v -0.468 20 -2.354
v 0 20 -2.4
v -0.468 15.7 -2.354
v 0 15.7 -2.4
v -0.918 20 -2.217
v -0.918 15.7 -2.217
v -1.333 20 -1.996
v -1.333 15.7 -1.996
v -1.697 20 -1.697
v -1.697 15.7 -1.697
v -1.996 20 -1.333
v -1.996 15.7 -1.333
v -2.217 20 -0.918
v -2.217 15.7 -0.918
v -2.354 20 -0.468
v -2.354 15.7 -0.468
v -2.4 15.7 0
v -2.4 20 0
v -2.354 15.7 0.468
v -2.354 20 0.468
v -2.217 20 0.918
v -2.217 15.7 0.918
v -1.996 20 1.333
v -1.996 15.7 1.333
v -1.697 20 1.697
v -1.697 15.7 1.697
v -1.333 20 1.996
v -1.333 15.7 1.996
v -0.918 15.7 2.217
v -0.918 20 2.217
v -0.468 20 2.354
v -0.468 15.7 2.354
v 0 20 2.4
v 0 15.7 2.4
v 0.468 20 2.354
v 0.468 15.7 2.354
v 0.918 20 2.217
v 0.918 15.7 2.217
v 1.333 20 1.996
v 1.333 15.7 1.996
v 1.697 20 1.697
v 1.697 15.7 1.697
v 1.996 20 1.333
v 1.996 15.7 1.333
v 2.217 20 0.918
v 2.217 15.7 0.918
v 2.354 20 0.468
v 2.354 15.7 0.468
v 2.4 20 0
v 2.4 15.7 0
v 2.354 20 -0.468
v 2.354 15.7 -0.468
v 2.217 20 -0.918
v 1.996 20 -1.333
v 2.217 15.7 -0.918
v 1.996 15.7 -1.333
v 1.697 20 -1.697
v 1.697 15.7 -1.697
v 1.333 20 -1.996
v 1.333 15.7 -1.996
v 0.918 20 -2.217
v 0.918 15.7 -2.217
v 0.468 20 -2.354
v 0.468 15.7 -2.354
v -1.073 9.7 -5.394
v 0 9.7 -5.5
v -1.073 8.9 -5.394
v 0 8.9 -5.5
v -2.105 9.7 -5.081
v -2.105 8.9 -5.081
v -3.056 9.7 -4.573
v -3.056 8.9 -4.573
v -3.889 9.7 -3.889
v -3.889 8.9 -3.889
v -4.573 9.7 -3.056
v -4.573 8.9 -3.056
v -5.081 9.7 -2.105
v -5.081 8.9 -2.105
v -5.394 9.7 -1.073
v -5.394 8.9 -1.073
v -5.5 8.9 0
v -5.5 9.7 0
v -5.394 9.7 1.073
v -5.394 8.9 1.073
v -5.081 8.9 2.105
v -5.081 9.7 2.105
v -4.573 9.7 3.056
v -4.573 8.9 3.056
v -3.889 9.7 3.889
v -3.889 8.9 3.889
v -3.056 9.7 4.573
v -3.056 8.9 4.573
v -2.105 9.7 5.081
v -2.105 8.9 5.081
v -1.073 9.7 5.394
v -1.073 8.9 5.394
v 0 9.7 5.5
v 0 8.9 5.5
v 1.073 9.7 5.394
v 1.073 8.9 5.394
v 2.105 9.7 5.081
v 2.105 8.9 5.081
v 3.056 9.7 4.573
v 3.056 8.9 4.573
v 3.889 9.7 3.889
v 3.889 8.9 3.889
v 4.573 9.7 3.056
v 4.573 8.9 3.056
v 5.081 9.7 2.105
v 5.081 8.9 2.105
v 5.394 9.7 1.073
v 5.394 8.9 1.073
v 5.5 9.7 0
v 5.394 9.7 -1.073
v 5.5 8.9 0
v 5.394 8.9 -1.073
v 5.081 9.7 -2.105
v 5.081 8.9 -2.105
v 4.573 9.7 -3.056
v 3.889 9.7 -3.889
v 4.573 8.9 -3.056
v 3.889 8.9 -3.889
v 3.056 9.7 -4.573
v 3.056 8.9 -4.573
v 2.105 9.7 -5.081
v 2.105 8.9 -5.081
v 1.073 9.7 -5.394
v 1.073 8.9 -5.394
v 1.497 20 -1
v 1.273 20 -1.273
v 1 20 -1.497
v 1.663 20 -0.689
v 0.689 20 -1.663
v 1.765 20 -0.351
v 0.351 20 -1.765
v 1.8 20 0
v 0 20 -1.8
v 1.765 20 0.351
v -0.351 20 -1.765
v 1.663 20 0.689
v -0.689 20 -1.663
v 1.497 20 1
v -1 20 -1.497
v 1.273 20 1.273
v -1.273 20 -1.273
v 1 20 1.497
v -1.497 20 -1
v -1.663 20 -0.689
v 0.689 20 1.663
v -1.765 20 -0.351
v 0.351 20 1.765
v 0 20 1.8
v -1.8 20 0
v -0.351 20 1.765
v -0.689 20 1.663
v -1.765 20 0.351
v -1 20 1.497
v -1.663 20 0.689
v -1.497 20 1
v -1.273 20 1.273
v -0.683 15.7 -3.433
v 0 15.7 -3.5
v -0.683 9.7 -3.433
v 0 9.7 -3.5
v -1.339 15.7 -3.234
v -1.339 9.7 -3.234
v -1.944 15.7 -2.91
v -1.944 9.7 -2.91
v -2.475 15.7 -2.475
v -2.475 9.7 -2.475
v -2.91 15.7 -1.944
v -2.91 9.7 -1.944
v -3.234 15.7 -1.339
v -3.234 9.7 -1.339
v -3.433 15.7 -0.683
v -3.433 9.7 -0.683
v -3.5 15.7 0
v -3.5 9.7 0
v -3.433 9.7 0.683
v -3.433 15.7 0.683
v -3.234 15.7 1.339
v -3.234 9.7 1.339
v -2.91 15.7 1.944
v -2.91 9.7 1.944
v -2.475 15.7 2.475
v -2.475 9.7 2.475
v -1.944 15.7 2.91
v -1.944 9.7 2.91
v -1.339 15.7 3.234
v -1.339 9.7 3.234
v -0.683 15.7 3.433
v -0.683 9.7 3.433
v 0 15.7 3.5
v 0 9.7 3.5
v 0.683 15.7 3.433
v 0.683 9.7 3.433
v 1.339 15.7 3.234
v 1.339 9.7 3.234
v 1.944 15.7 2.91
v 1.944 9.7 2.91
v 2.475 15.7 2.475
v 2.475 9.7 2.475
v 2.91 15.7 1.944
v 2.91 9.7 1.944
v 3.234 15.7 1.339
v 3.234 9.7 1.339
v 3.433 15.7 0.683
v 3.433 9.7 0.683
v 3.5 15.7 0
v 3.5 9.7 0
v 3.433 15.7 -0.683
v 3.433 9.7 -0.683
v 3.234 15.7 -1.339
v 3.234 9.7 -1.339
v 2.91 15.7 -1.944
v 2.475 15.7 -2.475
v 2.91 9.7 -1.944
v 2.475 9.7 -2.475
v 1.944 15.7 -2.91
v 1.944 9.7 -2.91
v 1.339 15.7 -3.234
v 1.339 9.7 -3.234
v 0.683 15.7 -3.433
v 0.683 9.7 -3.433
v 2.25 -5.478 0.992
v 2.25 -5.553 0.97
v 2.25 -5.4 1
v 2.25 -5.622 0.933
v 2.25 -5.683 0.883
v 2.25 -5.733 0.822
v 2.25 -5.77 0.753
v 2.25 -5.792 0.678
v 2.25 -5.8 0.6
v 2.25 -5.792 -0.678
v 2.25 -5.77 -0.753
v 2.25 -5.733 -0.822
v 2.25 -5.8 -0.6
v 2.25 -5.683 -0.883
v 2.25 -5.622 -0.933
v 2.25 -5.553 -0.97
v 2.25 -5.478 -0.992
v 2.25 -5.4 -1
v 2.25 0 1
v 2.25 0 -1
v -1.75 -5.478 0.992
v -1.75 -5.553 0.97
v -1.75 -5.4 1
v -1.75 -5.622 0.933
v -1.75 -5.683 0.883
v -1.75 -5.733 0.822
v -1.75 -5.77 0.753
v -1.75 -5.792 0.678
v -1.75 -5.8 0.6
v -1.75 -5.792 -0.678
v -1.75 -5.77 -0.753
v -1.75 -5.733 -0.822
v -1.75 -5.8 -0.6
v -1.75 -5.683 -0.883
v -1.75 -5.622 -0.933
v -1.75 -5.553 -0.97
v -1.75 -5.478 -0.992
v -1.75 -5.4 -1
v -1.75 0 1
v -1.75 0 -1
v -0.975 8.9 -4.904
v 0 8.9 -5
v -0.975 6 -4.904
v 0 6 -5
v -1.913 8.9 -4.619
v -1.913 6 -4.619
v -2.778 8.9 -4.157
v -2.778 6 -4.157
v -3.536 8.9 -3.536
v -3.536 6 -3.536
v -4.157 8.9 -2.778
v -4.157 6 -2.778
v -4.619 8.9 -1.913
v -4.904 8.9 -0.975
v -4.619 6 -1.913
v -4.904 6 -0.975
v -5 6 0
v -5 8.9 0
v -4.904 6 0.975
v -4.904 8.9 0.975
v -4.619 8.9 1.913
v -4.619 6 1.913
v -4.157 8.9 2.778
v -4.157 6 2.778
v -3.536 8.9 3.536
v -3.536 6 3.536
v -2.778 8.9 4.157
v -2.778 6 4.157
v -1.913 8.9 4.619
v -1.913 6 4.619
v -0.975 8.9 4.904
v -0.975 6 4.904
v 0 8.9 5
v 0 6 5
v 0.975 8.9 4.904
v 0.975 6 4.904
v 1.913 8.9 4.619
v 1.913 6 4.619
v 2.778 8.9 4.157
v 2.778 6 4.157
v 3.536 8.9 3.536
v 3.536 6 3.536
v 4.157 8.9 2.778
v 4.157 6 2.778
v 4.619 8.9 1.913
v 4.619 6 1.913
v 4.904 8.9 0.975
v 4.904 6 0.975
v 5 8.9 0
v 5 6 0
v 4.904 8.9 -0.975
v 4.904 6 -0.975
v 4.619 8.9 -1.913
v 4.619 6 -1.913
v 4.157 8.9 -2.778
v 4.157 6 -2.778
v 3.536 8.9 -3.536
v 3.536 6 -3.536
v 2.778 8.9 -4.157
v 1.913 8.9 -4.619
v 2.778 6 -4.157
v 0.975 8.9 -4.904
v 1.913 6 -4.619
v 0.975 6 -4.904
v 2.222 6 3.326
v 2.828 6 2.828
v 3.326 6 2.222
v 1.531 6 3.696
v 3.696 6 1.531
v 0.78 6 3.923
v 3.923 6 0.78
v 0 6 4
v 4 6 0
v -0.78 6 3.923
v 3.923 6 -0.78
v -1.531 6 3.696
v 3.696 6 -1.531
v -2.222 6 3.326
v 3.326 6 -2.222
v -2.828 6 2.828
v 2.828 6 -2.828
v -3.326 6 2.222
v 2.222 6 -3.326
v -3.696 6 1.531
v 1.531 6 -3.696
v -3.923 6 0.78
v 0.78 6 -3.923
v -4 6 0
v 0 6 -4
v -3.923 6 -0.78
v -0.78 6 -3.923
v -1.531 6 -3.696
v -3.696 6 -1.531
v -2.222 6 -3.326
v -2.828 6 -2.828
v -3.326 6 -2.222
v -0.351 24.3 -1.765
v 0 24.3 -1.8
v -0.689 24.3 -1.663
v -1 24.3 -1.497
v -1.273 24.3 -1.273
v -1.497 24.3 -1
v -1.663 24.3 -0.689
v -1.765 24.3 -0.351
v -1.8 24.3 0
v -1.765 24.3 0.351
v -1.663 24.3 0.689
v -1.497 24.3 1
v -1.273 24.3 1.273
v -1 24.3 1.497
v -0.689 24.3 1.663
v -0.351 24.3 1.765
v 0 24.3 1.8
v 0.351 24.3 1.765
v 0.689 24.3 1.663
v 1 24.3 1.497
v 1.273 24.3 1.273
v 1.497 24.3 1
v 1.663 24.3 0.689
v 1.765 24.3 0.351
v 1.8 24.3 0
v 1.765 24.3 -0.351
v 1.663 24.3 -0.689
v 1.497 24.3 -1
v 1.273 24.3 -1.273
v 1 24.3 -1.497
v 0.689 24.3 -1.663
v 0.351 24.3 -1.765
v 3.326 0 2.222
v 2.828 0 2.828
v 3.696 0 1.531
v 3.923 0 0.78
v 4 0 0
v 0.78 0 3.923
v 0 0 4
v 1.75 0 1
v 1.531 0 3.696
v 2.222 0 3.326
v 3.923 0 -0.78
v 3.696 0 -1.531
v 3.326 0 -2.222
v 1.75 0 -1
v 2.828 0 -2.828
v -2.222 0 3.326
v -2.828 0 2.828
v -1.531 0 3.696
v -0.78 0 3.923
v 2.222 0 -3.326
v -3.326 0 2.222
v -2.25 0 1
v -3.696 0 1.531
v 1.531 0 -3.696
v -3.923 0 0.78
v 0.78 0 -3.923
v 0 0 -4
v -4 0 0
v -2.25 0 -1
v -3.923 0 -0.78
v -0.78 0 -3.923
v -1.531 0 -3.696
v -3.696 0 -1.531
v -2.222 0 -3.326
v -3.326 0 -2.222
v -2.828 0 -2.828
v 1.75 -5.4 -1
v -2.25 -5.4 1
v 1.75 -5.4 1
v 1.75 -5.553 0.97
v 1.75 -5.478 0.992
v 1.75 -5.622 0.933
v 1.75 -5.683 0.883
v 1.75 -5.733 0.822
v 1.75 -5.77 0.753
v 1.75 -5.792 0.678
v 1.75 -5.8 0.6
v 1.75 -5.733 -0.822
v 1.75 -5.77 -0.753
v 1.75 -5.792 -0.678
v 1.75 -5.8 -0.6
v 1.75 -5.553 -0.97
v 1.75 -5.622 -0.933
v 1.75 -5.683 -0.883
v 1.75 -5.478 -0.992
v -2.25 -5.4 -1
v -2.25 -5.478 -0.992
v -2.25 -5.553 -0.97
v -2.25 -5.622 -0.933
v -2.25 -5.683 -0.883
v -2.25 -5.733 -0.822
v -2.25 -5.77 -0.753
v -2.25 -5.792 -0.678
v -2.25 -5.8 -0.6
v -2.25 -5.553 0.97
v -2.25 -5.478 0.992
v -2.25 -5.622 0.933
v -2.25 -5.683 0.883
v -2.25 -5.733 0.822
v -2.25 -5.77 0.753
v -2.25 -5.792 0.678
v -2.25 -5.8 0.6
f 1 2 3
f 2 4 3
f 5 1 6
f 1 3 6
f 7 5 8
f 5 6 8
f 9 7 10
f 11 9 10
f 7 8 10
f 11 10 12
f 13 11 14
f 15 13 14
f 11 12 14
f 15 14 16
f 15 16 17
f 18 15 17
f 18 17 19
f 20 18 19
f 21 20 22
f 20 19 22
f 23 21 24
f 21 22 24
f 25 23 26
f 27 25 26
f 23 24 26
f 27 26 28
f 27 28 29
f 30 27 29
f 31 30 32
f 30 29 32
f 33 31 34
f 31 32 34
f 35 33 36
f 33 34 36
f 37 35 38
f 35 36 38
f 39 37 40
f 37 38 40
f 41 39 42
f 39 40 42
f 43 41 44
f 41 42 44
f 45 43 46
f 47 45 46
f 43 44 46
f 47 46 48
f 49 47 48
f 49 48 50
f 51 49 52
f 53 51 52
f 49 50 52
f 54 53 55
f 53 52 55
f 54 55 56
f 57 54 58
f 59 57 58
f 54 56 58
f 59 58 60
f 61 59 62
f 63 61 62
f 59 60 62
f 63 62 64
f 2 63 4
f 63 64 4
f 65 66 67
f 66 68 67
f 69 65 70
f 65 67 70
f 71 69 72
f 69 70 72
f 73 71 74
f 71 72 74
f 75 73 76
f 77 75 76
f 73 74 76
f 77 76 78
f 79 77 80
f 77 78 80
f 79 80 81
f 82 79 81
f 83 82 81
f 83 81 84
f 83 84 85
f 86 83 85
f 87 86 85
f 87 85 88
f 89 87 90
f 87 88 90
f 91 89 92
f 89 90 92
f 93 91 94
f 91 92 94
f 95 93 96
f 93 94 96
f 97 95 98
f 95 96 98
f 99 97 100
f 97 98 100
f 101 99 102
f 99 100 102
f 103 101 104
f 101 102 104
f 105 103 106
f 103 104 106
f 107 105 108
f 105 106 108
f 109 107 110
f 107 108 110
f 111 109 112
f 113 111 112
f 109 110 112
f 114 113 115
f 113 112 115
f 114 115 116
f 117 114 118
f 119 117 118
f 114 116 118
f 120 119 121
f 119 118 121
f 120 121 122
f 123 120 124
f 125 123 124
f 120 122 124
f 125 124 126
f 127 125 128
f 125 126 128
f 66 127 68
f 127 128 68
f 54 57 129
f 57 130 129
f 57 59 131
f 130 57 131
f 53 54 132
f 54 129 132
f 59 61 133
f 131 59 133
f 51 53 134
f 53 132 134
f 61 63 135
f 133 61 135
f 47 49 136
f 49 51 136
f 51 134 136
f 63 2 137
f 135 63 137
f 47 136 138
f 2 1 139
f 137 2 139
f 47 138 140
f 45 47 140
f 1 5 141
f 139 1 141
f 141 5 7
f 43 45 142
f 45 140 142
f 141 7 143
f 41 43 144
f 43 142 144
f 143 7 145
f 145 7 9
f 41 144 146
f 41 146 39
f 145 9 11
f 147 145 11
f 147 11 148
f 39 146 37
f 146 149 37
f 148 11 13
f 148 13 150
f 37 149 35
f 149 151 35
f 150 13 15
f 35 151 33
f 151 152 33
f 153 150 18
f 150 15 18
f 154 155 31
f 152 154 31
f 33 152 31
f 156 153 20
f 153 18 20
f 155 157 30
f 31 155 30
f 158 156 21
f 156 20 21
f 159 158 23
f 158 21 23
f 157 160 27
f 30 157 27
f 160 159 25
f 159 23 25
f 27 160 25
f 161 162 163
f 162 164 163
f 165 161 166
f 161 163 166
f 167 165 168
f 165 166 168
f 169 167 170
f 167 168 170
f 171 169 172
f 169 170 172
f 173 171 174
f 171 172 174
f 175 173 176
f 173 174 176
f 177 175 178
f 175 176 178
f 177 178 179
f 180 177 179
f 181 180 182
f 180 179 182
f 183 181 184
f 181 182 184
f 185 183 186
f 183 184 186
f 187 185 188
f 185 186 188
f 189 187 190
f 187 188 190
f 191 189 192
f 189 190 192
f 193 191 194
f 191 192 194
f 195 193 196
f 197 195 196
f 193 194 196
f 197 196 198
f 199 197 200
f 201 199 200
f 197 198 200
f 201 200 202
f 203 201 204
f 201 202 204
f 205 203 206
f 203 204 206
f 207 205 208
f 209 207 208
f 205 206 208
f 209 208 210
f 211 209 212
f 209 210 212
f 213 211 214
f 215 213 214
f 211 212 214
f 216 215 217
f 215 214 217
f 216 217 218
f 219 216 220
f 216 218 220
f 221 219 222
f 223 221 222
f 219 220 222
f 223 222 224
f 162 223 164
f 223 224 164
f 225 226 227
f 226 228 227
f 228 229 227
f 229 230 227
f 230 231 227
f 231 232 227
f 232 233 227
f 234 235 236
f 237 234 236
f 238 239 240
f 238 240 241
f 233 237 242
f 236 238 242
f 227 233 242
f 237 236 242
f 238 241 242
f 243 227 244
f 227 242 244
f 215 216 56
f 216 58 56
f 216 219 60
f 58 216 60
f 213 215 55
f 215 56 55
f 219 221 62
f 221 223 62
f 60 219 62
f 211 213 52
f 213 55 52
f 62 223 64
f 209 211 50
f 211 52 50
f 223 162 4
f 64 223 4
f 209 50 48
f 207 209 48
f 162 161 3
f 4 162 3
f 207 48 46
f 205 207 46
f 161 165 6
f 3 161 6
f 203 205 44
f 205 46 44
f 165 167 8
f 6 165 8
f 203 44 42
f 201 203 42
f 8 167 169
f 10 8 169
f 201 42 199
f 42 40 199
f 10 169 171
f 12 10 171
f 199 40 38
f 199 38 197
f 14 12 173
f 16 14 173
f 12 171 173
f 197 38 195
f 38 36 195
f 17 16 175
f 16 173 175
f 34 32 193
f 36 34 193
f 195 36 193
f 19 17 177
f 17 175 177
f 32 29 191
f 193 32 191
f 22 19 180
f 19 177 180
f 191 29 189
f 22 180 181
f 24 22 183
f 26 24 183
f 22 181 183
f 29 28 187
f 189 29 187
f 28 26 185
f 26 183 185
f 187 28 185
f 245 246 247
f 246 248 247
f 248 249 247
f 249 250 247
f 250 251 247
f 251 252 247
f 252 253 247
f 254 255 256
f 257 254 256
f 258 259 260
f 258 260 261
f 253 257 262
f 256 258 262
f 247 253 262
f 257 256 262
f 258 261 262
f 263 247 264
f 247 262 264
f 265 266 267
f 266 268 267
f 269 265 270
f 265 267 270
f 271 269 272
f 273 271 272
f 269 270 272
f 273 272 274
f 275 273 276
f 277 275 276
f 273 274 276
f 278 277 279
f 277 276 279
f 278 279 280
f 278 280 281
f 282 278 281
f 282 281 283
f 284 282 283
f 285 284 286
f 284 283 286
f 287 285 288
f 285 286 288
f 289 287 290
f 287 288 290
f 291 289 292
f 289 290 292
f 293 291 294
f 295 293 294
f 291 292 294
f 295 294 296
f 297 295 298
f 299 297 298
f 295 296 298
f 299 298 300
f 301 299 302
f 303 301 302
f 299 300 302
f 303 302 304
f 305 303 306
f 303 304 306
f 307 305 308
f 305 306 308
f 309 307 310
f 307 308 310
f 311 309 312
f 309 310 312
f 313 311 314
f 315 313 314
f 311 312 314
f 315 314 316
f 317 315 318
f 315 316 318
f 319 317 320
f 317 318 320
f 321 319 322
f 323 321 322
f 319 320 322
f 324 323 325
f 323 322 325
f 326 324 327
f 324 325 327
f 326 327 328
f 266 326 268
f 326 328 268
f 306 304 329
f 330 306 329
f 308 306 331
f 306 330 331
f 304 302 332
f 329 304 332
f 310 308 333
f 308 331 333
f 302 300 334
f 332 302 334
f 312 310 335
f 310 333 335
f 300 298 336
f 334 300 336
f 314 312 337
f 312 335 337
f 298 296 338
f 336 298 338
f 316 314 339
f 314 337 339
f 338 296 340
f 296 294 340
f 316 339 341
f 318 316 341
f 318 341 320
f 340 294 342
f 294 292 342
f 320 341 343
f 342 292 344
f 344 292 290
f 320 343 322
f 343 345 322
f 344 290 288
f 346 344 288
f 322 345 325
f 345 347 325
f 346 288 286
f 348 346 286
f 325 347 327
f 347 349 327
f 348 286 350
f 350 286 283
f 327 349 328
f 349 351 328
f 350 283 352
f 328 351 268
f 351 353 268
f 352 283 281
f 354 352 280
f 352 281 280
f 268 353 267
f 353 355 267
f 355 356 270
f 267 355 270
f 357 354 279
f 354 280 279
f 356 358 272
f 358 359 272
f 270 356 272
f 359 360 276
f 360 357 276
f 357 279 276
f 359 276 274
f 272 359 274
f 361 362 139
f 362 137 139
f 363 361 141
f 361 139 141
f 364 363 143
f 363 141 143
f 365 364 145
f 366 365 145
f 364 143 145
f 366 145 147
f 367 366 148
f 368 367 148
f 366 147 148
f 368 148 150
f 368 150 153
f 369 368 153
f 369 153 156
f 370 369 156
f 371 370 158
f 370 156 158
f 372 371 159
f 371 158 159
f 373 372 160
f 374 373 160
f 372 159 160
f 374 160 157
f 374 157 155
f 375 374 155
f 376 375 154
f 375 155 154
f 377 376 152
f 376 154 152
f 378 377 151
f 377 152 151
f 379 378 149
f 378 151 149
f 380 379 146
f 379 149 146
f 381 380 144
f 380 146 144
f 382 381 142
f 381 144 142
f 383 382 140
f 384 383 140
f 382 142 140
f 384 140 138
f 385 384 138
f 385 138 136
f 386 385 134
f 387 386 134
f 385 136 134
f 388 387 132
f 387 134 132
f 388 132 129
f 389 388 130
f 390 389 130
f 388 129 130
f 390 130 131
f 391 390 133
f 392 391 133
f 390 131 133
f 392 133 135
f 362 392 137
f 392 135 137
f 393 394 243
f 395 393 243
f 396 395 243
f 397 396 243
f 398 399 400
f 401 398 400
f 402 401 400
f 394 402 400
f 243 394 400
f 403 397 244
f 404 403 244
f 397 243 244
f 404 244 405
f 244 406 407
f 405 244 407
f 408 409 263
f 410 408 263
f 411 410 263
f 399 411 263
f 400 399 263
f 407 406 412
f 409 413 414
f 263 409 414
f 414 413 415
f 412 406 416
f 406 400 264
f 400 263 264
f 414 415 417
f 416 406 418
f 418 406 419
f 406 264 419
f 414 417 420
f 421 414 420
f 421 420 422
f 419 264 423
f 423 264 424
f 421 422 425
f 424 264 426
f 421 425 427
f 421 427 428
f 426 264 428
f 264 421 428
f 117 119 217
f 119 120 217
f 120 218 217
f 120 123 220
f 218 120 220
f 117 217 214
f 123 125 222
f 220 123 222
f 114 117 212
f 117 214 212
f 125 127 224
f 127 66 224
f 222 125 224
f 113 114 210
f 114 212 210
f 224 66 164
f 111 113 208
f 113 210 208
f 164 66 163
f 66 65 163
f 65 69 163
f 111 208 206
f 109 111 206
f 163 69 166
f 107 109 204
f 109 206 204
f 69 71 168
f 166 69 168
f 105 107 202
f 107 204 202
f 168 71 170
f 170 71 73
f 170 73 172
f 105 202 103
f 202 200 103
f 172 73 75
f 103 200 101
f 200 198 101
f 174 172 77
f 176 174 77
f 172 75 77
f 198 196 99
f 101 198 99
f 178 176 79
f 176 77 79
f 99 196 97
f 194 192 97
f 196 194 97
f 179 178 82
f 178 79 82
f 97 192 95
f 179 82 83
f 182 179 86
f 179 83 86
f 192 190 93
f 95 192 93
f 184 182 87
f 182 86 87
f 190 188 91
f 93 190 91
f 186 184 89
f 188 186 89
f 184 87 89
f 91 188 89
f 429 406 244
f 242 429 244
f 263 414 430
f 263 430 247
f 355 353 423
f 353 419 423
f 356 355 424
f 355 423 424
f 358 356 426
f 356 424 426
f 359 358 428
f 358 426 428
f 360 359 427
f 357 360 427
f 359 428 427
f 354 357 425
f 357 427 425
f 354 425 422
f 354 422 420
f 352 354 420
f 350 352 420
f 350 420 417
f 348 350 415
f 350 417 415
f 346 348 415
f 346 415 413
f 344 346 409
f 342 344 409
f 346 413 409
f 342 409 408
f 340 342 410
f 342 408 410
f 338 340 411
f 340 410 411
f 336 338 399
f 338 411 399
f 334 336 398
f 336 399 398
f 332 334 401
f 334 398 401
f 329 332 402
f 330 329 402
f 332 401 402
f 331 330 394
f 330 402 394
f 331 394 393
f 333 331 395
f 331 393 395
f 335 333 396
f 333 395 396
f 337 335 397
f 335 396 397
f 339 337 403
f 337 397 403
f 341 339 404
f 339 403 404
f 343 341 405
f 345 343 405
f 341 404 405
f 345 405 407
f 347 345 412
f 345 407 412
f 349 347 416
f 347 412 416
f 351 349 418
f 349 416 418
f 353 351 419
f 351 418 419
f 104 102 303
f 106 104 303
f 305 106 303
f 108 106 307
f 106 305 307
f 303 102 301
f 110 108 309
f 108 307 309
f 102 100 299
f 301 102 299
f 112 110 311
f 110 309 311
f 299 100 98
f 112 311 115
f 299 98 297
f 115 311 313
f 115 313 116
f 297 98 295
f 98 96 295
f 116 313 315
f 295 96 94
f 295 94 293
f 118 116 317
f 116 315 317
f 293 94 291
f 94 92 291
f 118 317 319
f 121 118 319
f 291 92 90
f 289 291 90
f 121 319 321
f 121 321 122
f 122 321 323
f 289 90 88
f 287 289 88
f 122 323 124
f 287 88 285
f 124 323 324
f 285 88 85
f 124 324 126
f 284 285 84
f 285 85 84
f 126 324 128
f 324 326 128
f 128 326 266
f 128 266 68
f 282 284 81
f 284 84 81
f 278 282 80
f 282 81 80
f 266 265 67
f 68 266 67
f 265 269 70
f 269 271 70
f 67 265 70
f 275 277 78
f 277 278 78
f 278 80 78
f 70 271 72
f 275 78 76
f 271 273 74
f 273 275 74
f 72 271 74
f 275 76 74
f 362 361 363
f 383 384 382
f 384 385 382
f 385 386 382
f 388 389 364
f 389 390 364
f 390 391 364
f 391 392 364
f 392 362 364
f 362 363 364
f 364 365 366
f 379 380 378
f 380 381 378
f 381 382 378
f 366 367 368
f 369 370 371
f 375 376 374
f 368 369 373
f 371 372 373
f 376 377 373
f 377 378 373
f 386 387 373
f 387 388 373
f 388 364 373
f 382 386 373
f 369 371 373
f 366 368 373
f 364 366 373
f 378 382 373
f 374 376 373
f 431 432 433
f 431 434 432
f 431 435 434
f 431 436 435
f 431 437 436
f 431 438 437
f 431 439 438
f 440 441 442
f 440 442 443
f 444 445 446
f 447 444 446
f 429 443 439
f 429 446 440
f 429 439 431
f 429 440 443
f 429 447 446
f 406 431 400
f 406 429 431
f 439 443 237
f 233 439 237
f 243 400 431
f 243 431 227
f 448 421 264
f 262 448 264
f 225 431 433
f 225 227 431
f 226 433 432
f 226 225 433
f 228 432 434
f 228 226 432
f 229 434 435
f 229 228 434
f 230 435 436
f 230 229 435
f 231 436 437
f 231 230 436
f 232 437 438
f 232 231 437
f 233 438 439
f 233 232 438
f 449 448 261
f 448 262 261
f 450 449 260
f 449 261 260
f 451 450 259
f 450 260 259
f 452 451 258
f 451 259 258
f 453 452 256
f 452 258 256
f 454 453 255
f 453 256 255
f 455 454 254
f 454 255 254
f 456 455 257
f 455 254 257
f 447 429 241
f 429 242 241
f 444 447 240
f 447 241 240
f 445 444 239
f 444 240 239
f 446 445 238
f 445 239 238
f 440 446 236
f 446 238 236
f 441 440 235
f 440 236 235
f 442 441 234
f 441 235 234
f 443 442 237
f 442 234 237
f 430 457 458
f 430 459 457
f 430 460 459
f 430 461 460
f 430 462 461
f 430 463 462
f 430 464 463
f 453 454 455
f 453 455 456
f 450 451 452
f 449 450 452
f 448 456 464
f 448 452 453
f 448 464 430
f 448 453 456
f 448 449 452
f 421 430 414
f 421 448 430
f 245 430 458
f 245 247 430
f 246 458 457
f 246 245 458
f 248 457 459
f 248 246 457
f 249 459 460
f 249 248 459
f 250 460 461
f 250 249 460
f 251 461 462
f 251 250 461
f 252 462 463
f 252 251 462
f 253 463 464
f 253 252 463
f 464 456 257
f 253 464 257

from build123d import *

# Parameters (mm, degrees)
BOSS_EXTRU_1_DEPTH      = 1
BOSS_EXTRU_1_DEPTH_BACK = 1
ESQUISSE2_W             = 0.5
ESQUISSE2_H             = 5.8
CONG_2_R                = 0.4


with BuildPart() as part:
    # Esquisse1 → Révolution1 (revolve)
    with BuildSketch(Plane.XY):
        Polygon((0, 0), (0, 24.3), (-1.8, 24.3), (-1.8, 20), (-2.4, 20), (-2.4, 15.7), (-3.5, 15.7), (-3.5, 9.7), (-5.5, 9.7), (-5.5, 8.9), (-5, 8.9), (-5, 6), (-4, 6), (-4, 0), align=None)
    revolve(axis=Axis((0, 0, 0), (0, 1, 0)))

    # Esquisse2 → Boss.-Extru.1 (add, two sides: drawn at the far end of the back side and taken through both)
    with BuildSketch(Plane.XY.offset(-BOSS_EXTRU_1_DEPTH_BACK)):
        with Locations((-2, -2.9)):
            Rectangle(ESQUISSE2_W, ESQUISSE2_H)
        with Locations((2, -2.9)):
            Rectangle(ESQUISSE2_W, ESQUISSE2_H)
    extrude(amount=BOSS_EXTRU_1_DEPTH + BOSS_EXTRU_1_DEPTH_BACK)

    # Congé2
    cong_2_edges = [part.edges().sort_by_distance(p)[0] for p in [
        (2, -5.8, 1),
        (-2, -5.8, -1),
        (-2, -5.8, 1),
        (2, -5.8, -1),
    ]]
    fillet(cong_2_edges, radius=CONG_2_R)


solid = part.part
